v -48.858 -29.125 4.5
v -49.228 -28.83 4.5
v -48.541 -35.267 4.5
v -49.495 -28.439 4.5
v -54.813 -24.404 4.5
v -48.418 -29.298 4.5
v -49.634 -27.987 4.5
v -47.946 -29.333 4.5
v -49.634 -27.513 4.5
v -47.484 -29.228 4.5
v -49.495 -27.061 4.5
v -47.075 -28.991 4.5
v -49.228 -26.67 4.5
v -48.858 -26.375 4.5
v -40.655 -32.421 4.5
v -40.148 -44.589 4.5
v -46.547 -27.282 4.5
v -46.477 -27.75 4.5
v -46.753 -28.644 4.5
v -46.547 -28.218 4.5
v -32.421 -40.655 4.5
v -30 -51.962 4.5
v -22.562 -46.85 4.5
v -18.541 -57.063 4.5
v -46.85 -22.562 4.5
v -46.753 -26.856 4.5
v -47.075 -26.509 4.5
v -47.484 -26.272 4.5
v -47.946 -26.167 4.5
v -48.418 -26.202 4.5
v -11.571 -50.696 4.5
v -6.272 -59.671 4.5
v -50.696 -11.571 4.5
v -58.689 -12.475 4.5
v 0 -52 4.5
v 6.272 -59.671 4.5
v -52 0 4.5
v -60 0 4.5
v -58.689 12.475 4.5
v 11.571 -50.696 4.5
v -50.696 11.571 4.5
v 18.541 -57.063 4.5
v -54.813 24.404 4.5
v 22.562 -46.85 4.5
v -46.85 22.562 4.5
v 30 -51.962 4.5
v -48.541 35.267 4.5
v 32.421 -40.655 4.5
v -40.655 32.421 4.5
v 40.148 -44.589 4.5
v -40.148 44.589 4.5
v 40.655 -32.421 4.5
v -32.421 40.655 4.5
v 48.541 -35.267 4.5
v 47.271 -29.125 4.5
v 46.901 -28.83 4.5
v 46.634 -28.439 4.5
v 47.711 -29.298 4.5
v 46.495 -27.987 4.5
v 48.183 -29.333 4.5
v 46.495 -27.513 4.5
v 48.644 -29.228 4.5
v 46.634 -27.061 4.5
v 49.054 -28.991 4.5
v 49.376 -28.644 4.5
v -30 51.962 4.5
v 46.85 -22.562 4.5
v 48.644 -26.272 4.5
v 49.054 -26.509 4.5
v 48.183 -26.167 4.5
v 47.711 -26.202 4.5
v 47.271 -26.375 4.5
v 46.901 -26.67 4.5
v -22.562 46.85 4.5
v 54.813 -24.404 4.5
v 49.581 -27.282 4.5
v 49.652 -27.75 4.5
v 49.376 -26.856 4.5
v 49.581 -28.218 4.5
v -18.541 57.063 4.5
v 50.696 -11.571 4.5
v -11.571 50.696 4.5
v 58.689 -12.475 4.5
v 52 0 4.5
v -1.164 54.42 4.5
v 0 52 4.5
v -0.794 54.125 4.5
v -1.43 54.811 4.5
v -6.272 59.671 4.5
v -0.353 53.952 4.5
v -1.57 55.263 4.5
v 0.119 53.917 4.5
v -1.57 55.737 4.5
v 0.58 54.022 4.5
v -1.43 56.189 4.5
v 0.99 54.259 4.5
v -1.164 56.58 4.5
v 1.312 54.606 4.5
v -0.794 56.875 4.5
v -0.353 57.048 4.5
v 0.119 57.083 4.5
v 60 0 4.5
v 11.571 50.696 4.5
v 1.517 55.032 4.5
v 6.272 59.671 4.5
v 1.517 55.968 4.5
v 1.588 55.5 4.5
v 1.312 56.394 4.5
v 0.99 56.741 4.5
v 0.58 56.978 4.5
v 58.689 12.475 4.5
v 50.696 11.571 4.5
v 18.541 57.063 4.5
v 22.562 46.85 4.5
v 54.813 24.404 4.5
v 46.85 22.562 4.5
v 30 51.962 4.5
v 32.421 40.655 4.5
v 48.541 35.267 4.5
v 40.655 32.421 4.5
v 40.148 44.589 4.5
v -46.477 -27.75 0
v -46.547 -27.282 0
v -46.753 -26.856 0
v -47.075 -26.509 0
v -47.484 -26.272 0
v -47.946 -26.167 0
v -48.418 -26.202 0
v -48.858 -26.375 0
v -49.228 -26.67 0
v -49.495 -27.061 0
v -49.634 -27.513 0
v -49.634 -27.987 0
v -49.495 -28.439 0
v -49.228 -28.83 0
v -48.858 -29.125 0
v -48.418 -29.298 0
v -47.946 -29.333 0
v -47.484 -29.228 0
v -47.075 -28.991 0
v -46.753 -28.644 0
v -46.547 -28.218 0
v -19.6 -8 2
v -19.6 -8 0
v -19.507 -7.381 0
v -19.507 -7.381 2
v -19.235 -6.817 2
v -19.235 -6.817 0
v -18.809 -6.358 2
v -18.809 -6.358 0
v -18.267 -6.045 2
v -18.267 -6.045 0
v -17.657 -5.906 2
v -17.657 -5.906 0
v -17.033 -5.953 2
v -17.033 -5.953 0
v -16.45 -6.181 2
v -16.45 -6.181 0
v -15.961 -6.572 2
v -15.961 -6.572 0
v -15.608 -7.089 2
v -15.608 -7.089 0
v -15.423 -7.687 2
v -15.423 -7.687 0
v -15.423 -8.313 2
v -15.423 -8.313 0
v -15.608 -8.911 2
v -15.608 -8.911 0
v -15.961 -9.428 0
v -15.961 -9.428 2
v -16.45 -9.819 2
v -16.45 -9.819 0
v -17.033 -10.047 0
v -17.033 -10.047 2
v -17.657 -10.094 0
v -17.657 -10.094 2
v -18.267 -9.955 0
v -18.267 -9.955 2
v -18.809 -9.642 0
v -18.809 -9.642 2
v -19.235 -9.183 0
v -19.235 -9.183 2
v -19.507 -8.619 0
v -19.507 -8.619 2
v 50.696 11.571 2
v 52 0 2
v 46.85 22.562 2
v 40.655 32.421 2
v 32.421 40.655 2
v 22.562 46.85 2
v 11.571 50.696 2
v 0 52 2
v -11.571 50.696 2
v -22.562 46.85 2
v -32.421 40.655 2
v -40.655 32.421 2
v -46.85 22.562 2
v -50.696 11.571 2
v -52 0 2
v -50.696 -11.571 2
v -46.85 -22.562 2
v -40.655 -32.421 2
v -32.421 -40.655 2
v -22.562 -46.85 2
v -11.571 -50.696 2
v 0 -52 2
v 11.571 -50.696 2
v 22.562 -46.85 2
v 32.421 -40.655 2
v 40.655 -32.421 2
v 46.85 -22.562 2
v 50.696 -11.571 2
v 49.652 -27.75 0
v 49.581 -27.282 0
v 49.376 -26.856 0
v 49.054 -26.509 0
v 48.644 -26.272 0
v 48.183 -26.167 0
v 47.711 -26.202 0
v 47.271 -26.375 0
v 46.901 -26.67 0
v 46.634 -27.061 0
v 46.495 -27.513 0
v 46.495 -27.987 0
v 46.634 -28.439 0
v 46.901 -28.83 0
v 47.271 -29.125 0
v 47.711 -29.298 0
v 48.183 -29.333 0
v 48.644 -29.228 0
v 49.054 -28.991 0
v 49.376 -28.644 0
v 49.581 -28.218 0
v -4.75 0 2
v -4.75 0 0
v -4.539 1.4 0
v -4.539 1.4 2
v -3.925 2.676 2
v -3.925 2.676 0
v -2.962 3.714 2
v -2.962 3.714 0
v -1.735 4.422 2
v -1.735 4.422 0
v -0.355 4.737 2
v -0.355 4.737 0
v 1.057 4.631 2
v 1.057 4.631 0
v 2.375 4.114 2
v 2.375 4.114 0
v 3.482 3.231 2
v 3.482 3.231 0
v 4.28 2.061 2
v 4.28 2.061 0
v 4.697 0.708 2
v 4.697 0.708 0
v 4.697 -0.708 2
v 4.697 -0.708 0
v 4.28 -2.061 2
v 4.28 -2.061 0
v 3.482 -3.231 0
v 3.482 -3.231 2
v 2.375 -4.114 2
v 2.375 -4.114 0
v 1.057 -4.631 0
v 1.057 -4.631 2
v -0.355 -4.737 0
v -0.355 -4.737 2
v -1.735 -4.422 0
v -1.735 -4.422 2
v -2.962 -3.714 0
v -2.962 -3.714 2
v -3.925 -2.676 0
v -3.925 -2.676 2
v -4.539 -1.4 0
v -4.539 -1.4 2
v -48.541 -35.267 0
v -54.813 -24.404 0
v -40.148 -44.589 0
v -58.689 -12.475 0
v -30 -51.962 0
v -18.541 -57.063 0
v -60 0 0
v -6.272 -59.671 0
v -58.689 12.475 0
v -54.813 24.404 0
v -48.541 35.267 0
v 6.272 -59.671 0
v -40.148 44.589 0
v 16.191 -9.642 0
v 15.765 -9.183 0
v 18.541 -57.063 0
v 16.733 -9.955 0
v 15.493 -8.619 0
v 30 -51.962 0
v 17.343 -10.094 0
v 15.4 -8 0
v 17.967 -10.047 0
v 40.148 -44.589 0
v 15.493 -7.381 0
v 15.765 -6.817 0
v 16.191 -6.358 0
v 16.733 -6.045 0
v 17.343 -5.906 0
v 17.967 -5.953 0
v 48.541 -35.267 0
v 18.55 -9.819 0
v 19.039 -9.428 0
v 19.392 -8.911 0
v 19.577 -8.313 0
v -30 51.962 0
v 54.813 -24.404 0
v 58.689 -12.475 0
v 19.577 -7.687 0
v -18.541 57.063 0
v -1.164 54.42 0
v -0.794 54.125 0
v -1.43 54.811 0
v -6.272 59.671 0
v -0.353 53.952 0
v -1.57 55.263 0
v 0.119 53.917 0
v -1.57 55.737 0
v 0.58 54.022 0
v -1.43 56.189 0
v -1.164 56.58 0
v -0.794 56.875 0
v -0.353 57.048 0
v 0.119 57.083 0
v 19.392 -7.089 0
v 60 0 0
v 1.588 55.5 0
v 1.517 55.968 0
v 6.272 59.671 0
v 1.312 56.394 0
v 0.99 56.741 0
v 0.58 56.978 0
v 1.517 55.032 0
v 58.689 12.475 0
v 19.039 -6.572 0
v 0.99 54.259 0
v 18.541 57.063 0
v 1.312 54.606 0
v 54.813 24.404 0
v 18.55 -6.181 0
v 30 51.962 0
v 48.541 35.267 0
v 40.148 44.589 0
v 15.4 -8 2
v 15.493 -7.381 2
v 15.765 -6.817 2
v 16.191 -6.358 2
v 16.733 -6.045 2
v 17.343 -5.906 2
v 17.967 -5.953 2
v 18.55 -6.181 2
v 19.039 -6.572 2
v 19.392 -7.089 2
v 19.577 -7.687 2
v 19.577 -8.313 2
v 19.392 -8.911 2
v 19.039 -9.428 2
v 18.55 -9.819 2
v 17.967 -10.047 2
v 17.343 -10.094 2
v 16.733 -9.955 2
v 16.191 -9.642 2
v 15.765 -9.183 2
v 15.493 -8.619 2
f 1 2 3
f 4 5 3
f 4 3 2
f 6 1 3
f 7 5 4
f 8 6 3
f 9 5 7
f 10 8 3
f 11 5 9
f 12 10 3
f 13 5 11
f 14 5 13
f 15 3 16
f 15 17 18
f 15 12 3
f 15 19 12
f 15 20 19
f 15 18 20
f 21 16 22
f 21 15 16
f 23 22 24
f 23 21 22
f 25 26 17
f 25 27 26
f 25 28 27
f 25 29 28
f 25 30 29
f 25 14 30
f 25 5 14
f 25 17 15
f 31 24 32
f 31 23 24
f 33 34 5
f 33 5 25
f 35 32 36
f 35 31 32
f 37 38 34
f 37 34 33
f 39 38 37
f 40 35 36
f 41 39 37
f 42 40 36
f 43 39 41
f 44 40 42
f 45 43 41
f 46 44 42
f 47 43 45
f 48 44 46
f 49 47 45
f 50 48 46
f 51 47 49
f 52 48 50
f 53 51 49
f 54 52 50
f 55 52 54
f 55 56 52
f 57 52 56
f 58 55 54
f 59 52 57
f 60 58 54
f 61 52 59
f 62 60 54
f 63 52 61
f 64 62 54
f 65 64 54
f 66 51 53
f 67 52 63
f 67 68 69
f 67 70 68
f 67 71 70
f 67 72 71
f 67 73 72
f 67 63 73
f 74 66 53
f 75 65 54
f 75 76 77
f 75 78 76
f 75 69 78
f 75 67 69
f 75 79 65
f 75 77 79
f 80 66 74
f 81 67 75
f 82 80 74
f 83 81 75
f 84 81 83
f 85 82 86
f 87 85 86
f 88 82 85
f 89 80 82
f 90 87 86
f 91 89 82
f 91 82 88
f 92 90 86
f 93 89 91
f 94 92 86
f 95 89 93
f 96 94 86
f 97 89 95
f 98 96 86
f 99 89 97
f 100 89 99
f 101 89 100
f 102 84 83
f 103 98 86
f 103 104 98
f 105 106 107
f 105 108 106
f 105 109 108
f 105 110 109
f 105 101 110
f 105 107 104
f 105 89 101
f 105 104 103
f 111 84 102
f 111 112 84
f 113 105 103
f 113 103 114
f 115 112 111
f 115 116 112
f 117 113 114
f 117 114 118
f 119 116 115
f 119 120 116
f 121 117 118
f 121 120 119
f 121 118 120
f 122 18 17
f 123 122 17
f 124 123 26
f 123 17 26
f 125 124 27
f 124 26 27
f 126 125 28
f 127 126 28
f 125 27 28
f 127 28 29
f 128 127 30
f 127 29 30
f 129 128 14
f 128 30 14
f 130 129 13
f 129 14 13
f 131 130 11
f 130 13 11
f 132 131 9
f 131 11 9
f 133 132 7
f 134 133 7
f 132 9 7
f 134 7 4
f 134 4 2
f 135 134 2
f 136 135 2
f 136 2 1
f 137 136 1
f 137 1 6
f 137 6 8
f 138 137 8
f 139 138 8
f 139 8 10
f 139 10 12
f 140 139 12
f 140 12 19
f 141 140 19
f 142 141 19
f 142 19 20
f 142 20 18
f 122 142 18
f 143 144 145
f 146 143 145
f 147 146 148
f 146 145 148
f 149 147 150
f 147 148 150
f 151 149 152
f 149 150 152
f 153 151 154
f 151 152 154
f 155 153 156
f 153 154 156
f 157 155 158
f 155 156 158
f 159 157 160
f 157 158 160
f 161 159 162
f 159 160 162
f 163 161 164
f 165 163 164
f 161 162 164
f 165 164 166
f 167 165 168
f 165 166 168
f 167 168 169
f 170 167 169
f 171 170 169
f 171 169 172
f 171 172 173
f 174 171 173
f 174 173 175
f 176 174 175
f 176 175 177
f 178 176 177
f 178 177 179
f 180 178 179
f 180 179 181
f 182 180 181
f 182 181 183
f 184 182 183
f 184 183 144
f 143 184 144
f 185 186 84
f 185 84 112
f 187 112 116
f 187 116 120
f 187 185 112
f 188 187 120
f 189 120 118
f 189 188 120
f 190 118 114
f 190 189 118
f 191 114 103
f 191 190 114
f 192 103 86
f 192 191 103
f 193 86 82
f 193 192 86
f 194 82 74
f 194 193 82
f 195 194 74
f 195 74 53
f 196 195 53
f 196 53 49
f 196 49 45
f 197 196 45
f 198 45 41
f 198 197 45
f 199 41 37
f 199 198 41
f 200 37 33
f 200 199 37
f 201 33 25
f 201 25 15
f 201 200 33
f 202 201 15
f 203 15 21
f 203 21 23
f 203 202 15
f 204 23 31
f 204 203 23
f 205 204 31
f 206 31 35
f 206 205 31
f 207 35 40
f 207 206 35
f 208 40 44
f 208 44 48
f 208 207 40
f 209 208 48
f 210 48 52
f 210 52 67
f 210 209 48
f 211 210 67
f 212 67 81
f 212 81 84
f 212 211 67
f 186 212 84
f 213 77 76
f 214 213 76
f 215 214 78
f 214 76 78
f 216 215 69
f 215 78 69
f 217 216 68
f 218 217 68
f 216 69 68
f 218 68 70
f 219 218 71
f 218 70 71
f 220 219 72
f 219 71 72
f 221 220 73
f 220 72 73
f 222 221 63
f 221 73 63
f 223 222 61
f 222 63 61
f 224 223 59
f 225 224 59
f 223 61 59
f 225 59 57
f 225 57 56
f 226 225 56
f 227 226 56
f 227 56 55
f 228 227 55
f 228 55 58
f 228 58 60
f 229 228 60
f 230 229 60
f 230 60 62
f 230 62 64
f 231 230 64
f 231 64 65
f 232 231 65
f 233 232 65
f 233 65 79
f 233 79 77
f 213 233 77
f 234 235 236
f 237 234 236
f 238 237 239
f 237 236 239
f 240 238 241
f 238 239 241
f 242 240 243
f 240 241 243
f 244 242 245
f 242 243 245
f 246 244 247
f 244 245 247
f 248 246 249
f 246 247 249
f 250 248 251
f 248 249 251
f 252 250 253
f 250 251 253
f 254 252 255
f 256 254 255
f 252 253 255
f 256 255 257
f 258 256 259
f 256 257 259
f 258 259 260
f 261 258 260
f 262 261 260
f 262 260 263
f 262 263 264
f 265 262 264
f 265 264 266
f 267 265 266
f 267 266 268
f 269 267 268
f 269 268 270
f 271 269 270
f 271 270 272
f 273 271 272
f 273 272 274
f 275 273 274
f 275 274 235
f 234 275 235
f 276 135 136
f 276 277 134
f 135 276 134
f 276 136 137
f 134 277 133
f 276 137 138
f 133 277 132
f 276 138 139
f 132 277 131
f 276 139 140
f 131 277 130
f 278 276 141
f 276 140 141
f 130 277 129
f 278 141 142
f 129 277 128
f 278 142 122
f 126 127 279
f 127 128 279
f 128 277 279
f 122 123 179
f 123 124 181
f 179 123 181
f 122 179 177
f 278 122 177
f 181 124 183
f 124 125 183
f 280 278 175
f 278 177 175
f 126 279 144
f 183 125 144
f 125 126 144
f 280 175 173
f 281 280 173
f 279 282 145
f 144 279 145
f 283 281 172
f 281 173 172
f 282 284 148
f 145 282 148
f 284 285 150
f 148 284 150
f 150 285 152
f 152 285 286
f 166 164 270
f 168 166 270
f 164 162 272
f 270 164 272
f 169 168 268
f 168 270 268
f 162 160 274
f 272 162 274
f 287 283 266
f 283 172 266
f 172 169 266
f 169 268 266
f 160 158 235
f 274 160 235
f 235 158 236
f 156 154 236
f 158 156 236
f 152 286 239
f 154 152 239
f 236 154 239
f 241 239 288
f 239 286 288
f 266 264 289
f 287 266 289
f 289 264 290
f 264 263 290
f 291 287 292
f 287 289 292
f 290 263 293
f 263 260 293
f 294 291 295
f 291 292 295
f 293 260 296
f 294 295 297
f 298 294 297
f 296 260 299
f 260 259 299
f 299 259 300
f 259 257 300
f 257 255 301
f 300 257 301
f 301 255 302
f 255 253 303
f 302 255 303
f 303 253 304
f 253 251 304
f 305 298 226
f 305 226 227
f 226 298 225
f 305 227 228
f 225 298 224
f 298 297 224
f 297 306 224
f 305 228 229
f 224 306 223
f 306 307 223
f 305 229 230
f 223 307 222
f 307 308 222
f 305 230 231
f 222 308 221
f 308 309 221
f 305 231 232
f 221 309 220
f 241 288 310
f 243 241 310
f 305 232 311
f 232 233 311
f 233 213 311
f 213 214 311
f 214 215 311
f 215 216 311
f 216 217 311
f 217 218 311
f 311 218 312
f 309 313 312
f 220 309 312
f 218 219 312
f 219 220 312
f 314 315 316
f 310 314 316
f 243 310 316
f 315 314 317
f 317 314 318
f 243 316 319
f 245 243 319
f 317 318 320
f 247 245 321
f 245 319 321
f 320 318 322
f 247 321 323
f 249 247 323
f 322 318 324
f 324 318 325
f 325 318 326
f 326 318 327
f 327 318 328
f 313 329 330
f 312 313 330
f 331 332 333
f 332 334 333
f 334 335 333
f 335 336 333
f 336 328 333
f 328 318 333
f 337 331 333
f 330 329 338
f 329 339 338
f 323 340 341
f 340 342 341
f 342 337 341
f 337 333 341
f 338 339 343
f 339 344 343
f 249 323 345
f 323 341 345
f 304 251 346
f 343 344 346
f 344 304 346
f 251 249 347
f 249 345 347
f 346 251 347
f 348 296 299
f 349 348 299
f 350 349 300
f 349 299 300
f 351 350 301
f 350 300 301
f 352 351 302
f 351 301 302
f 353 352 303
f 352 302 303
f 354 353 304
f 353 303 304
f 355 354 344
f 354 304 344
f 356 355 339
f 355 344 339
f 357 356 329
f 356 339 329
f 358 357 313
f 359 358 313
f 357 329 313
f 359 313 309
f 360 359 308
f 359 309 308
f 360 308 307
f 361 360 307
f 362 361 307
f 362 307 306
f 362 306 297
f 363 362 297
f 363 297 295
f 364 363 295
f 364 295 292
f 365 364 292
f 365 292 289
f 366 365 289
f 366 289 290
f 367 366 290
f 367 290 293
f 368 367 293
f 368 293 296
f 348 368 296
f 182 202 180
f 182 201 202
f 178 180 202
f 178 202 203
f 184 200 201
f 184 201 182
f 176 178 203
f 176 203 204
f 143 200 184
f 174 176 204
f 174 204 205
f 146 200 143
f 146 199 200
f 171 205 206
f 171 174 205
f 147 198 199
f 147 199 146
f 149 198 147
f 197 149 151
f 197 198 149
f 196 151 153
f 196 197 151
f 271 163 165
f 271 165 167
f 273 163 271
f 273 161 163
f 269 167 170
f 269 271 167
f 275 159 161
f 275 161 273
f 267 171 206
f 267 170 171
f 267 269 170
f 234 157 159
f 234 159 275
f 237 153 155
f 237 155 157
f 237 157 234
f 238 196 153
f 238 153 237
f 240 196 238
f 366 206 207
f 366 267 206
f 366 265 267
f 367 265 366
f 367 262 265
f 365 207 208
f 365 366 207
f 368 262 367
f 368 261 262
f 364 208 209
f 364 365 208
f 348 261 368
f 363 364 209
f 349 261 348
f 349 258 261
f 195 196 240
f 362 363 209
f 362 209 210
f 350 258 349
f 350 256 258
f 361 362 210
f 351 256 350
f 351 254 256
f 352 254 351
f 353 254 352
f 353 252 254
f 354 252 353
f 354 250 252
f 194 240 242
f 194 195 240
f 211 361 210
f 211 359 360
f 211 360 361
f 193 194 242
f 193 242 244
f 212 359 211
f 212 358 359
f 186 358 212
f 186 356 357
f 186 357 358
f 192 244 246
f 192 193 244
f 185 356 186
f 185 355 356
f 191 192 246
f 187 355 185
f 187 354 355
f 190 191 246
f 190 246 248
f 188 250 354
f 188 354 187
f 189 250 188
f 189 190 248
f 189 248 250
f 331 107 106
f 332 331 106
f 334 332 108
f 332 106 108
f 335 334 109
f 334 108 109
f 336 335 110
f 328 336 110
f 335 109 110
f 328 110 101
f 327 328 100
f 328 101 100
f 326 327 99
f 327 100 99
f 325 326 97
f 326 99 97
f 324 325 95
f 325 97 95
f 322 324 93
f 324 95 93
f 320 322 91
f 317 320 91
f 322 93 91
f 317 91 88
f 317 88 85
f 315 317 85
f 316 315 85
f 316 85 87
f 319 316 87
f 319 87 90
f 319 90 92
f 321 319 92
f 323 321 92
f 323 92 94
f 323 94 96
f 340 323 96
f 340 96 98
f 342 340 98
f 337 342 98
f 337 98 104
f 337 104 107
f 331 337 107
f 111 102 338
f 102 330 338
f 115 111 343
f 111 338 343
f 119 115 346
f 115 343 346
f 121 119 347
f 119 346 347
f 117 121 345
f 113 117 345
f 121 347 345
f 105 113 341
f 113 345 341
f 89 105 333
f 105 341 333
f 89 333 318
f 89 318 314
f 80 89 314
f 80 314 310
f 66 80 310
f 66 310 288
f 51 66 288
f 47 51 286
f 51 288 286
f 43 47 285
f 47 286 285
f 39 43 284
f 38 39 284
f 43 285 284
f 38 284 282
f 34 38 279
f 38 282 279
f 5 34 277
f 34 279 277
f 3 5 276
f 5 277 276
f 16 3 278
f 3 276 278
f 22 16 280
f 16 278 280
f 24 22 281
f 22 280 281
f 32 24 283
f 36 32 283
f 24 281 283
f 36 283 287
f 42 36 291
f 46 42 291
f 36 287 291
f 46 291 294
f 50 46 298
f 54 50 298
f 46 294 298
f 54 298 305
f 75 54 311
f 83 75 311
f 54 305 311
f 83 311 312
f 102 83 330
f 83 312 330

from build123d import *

# Parameters (mm, degrees)
CROQUIS1_R              = 60
SALIENTE_EXTRUIR1_DEPTH = 2
CROQUIS2_R              = 60
CROQUIS2_R_2            = 52
SALIENTE_EXTRUIR2_DEPTH = 2.5
CROQUIS3_R              = 1.5875
CORTAR_EXTRUIR1_DEPTH   = 85.97205423
CROQUIS4_R              = 4.75
CORTAR_EXTRUIR2_DEPTH   = 85.97205423
CROQUIS5_R              = 2.1
CORTAR_EXTRUIR3_DEPTH   = 85.97205423


with BuildPart() as part:
    # Croquis1 → Saliente-Extruir1 (new body)
    with BuildSketch(Plane.XY):
        Circle(CROQUIS1_R)
    extrude(amount=SALIENTE_EXTRUIR1_DEPTH)

    # Croquis2 → Saliente-Extruir2 (add)
    with BuildSketch(Plane.XY.offset(2)):
        Circle(CROQUIS2_R)
        Circle(CROQUIS2_R_2, mode=Mode.SUBTRACT)
    extrude(amount=SALIENTE_EXTRUIR2_DEPTH)

    # Croquis3 → Cortar-Extruir1 (cut, through all)
    with BuildSketch(Plane.XY.offset(4.5)):
        with Locations((0, 55.5)):
            Circle(CROQUIS3_R)
        with Locations((48.06440991, -27.75)):
            Circle(CROQUIS3_R)
        with Locations((-48.06440991, -27.75)):
            Circle(CROQUIS3_R)
    extrude(amount=-CORTAR_EXTRUIR1_DEPTH, mode=Mode.SUBTRACT)

    # Croquis4 → Cortar-Extruir2 (cut, through all)
    with BuildSketch(Plane(origin=(0, 0, 0), x_dir=(-1, 0, 0), z_dir=(0, 0, -1))):
        Circle(CROQUIS4_R)
    extrude(amount=-CORTAR_EXTRUIR2_DEPTH, mode=Mode.SUBTRACT)

    # Croquis5 → Cortar-Extruir3 (cut, through all)
    with BuildSketch(Plane(origin=(0, 0, 0), x_dir=(-1, 0, 0), z_dir=(0, 0, -1))):
        with Locations((-17.5, -8)):
            Circle(CROQUIS5_R)
        with Locations((17.5, -8)):
            Circle(CROQUIS5_R)
    extrude(amount=-CORTAR_EXTRUIR3_DEPTH, mode=Mode.SUBTRACT)


solid = part.part
